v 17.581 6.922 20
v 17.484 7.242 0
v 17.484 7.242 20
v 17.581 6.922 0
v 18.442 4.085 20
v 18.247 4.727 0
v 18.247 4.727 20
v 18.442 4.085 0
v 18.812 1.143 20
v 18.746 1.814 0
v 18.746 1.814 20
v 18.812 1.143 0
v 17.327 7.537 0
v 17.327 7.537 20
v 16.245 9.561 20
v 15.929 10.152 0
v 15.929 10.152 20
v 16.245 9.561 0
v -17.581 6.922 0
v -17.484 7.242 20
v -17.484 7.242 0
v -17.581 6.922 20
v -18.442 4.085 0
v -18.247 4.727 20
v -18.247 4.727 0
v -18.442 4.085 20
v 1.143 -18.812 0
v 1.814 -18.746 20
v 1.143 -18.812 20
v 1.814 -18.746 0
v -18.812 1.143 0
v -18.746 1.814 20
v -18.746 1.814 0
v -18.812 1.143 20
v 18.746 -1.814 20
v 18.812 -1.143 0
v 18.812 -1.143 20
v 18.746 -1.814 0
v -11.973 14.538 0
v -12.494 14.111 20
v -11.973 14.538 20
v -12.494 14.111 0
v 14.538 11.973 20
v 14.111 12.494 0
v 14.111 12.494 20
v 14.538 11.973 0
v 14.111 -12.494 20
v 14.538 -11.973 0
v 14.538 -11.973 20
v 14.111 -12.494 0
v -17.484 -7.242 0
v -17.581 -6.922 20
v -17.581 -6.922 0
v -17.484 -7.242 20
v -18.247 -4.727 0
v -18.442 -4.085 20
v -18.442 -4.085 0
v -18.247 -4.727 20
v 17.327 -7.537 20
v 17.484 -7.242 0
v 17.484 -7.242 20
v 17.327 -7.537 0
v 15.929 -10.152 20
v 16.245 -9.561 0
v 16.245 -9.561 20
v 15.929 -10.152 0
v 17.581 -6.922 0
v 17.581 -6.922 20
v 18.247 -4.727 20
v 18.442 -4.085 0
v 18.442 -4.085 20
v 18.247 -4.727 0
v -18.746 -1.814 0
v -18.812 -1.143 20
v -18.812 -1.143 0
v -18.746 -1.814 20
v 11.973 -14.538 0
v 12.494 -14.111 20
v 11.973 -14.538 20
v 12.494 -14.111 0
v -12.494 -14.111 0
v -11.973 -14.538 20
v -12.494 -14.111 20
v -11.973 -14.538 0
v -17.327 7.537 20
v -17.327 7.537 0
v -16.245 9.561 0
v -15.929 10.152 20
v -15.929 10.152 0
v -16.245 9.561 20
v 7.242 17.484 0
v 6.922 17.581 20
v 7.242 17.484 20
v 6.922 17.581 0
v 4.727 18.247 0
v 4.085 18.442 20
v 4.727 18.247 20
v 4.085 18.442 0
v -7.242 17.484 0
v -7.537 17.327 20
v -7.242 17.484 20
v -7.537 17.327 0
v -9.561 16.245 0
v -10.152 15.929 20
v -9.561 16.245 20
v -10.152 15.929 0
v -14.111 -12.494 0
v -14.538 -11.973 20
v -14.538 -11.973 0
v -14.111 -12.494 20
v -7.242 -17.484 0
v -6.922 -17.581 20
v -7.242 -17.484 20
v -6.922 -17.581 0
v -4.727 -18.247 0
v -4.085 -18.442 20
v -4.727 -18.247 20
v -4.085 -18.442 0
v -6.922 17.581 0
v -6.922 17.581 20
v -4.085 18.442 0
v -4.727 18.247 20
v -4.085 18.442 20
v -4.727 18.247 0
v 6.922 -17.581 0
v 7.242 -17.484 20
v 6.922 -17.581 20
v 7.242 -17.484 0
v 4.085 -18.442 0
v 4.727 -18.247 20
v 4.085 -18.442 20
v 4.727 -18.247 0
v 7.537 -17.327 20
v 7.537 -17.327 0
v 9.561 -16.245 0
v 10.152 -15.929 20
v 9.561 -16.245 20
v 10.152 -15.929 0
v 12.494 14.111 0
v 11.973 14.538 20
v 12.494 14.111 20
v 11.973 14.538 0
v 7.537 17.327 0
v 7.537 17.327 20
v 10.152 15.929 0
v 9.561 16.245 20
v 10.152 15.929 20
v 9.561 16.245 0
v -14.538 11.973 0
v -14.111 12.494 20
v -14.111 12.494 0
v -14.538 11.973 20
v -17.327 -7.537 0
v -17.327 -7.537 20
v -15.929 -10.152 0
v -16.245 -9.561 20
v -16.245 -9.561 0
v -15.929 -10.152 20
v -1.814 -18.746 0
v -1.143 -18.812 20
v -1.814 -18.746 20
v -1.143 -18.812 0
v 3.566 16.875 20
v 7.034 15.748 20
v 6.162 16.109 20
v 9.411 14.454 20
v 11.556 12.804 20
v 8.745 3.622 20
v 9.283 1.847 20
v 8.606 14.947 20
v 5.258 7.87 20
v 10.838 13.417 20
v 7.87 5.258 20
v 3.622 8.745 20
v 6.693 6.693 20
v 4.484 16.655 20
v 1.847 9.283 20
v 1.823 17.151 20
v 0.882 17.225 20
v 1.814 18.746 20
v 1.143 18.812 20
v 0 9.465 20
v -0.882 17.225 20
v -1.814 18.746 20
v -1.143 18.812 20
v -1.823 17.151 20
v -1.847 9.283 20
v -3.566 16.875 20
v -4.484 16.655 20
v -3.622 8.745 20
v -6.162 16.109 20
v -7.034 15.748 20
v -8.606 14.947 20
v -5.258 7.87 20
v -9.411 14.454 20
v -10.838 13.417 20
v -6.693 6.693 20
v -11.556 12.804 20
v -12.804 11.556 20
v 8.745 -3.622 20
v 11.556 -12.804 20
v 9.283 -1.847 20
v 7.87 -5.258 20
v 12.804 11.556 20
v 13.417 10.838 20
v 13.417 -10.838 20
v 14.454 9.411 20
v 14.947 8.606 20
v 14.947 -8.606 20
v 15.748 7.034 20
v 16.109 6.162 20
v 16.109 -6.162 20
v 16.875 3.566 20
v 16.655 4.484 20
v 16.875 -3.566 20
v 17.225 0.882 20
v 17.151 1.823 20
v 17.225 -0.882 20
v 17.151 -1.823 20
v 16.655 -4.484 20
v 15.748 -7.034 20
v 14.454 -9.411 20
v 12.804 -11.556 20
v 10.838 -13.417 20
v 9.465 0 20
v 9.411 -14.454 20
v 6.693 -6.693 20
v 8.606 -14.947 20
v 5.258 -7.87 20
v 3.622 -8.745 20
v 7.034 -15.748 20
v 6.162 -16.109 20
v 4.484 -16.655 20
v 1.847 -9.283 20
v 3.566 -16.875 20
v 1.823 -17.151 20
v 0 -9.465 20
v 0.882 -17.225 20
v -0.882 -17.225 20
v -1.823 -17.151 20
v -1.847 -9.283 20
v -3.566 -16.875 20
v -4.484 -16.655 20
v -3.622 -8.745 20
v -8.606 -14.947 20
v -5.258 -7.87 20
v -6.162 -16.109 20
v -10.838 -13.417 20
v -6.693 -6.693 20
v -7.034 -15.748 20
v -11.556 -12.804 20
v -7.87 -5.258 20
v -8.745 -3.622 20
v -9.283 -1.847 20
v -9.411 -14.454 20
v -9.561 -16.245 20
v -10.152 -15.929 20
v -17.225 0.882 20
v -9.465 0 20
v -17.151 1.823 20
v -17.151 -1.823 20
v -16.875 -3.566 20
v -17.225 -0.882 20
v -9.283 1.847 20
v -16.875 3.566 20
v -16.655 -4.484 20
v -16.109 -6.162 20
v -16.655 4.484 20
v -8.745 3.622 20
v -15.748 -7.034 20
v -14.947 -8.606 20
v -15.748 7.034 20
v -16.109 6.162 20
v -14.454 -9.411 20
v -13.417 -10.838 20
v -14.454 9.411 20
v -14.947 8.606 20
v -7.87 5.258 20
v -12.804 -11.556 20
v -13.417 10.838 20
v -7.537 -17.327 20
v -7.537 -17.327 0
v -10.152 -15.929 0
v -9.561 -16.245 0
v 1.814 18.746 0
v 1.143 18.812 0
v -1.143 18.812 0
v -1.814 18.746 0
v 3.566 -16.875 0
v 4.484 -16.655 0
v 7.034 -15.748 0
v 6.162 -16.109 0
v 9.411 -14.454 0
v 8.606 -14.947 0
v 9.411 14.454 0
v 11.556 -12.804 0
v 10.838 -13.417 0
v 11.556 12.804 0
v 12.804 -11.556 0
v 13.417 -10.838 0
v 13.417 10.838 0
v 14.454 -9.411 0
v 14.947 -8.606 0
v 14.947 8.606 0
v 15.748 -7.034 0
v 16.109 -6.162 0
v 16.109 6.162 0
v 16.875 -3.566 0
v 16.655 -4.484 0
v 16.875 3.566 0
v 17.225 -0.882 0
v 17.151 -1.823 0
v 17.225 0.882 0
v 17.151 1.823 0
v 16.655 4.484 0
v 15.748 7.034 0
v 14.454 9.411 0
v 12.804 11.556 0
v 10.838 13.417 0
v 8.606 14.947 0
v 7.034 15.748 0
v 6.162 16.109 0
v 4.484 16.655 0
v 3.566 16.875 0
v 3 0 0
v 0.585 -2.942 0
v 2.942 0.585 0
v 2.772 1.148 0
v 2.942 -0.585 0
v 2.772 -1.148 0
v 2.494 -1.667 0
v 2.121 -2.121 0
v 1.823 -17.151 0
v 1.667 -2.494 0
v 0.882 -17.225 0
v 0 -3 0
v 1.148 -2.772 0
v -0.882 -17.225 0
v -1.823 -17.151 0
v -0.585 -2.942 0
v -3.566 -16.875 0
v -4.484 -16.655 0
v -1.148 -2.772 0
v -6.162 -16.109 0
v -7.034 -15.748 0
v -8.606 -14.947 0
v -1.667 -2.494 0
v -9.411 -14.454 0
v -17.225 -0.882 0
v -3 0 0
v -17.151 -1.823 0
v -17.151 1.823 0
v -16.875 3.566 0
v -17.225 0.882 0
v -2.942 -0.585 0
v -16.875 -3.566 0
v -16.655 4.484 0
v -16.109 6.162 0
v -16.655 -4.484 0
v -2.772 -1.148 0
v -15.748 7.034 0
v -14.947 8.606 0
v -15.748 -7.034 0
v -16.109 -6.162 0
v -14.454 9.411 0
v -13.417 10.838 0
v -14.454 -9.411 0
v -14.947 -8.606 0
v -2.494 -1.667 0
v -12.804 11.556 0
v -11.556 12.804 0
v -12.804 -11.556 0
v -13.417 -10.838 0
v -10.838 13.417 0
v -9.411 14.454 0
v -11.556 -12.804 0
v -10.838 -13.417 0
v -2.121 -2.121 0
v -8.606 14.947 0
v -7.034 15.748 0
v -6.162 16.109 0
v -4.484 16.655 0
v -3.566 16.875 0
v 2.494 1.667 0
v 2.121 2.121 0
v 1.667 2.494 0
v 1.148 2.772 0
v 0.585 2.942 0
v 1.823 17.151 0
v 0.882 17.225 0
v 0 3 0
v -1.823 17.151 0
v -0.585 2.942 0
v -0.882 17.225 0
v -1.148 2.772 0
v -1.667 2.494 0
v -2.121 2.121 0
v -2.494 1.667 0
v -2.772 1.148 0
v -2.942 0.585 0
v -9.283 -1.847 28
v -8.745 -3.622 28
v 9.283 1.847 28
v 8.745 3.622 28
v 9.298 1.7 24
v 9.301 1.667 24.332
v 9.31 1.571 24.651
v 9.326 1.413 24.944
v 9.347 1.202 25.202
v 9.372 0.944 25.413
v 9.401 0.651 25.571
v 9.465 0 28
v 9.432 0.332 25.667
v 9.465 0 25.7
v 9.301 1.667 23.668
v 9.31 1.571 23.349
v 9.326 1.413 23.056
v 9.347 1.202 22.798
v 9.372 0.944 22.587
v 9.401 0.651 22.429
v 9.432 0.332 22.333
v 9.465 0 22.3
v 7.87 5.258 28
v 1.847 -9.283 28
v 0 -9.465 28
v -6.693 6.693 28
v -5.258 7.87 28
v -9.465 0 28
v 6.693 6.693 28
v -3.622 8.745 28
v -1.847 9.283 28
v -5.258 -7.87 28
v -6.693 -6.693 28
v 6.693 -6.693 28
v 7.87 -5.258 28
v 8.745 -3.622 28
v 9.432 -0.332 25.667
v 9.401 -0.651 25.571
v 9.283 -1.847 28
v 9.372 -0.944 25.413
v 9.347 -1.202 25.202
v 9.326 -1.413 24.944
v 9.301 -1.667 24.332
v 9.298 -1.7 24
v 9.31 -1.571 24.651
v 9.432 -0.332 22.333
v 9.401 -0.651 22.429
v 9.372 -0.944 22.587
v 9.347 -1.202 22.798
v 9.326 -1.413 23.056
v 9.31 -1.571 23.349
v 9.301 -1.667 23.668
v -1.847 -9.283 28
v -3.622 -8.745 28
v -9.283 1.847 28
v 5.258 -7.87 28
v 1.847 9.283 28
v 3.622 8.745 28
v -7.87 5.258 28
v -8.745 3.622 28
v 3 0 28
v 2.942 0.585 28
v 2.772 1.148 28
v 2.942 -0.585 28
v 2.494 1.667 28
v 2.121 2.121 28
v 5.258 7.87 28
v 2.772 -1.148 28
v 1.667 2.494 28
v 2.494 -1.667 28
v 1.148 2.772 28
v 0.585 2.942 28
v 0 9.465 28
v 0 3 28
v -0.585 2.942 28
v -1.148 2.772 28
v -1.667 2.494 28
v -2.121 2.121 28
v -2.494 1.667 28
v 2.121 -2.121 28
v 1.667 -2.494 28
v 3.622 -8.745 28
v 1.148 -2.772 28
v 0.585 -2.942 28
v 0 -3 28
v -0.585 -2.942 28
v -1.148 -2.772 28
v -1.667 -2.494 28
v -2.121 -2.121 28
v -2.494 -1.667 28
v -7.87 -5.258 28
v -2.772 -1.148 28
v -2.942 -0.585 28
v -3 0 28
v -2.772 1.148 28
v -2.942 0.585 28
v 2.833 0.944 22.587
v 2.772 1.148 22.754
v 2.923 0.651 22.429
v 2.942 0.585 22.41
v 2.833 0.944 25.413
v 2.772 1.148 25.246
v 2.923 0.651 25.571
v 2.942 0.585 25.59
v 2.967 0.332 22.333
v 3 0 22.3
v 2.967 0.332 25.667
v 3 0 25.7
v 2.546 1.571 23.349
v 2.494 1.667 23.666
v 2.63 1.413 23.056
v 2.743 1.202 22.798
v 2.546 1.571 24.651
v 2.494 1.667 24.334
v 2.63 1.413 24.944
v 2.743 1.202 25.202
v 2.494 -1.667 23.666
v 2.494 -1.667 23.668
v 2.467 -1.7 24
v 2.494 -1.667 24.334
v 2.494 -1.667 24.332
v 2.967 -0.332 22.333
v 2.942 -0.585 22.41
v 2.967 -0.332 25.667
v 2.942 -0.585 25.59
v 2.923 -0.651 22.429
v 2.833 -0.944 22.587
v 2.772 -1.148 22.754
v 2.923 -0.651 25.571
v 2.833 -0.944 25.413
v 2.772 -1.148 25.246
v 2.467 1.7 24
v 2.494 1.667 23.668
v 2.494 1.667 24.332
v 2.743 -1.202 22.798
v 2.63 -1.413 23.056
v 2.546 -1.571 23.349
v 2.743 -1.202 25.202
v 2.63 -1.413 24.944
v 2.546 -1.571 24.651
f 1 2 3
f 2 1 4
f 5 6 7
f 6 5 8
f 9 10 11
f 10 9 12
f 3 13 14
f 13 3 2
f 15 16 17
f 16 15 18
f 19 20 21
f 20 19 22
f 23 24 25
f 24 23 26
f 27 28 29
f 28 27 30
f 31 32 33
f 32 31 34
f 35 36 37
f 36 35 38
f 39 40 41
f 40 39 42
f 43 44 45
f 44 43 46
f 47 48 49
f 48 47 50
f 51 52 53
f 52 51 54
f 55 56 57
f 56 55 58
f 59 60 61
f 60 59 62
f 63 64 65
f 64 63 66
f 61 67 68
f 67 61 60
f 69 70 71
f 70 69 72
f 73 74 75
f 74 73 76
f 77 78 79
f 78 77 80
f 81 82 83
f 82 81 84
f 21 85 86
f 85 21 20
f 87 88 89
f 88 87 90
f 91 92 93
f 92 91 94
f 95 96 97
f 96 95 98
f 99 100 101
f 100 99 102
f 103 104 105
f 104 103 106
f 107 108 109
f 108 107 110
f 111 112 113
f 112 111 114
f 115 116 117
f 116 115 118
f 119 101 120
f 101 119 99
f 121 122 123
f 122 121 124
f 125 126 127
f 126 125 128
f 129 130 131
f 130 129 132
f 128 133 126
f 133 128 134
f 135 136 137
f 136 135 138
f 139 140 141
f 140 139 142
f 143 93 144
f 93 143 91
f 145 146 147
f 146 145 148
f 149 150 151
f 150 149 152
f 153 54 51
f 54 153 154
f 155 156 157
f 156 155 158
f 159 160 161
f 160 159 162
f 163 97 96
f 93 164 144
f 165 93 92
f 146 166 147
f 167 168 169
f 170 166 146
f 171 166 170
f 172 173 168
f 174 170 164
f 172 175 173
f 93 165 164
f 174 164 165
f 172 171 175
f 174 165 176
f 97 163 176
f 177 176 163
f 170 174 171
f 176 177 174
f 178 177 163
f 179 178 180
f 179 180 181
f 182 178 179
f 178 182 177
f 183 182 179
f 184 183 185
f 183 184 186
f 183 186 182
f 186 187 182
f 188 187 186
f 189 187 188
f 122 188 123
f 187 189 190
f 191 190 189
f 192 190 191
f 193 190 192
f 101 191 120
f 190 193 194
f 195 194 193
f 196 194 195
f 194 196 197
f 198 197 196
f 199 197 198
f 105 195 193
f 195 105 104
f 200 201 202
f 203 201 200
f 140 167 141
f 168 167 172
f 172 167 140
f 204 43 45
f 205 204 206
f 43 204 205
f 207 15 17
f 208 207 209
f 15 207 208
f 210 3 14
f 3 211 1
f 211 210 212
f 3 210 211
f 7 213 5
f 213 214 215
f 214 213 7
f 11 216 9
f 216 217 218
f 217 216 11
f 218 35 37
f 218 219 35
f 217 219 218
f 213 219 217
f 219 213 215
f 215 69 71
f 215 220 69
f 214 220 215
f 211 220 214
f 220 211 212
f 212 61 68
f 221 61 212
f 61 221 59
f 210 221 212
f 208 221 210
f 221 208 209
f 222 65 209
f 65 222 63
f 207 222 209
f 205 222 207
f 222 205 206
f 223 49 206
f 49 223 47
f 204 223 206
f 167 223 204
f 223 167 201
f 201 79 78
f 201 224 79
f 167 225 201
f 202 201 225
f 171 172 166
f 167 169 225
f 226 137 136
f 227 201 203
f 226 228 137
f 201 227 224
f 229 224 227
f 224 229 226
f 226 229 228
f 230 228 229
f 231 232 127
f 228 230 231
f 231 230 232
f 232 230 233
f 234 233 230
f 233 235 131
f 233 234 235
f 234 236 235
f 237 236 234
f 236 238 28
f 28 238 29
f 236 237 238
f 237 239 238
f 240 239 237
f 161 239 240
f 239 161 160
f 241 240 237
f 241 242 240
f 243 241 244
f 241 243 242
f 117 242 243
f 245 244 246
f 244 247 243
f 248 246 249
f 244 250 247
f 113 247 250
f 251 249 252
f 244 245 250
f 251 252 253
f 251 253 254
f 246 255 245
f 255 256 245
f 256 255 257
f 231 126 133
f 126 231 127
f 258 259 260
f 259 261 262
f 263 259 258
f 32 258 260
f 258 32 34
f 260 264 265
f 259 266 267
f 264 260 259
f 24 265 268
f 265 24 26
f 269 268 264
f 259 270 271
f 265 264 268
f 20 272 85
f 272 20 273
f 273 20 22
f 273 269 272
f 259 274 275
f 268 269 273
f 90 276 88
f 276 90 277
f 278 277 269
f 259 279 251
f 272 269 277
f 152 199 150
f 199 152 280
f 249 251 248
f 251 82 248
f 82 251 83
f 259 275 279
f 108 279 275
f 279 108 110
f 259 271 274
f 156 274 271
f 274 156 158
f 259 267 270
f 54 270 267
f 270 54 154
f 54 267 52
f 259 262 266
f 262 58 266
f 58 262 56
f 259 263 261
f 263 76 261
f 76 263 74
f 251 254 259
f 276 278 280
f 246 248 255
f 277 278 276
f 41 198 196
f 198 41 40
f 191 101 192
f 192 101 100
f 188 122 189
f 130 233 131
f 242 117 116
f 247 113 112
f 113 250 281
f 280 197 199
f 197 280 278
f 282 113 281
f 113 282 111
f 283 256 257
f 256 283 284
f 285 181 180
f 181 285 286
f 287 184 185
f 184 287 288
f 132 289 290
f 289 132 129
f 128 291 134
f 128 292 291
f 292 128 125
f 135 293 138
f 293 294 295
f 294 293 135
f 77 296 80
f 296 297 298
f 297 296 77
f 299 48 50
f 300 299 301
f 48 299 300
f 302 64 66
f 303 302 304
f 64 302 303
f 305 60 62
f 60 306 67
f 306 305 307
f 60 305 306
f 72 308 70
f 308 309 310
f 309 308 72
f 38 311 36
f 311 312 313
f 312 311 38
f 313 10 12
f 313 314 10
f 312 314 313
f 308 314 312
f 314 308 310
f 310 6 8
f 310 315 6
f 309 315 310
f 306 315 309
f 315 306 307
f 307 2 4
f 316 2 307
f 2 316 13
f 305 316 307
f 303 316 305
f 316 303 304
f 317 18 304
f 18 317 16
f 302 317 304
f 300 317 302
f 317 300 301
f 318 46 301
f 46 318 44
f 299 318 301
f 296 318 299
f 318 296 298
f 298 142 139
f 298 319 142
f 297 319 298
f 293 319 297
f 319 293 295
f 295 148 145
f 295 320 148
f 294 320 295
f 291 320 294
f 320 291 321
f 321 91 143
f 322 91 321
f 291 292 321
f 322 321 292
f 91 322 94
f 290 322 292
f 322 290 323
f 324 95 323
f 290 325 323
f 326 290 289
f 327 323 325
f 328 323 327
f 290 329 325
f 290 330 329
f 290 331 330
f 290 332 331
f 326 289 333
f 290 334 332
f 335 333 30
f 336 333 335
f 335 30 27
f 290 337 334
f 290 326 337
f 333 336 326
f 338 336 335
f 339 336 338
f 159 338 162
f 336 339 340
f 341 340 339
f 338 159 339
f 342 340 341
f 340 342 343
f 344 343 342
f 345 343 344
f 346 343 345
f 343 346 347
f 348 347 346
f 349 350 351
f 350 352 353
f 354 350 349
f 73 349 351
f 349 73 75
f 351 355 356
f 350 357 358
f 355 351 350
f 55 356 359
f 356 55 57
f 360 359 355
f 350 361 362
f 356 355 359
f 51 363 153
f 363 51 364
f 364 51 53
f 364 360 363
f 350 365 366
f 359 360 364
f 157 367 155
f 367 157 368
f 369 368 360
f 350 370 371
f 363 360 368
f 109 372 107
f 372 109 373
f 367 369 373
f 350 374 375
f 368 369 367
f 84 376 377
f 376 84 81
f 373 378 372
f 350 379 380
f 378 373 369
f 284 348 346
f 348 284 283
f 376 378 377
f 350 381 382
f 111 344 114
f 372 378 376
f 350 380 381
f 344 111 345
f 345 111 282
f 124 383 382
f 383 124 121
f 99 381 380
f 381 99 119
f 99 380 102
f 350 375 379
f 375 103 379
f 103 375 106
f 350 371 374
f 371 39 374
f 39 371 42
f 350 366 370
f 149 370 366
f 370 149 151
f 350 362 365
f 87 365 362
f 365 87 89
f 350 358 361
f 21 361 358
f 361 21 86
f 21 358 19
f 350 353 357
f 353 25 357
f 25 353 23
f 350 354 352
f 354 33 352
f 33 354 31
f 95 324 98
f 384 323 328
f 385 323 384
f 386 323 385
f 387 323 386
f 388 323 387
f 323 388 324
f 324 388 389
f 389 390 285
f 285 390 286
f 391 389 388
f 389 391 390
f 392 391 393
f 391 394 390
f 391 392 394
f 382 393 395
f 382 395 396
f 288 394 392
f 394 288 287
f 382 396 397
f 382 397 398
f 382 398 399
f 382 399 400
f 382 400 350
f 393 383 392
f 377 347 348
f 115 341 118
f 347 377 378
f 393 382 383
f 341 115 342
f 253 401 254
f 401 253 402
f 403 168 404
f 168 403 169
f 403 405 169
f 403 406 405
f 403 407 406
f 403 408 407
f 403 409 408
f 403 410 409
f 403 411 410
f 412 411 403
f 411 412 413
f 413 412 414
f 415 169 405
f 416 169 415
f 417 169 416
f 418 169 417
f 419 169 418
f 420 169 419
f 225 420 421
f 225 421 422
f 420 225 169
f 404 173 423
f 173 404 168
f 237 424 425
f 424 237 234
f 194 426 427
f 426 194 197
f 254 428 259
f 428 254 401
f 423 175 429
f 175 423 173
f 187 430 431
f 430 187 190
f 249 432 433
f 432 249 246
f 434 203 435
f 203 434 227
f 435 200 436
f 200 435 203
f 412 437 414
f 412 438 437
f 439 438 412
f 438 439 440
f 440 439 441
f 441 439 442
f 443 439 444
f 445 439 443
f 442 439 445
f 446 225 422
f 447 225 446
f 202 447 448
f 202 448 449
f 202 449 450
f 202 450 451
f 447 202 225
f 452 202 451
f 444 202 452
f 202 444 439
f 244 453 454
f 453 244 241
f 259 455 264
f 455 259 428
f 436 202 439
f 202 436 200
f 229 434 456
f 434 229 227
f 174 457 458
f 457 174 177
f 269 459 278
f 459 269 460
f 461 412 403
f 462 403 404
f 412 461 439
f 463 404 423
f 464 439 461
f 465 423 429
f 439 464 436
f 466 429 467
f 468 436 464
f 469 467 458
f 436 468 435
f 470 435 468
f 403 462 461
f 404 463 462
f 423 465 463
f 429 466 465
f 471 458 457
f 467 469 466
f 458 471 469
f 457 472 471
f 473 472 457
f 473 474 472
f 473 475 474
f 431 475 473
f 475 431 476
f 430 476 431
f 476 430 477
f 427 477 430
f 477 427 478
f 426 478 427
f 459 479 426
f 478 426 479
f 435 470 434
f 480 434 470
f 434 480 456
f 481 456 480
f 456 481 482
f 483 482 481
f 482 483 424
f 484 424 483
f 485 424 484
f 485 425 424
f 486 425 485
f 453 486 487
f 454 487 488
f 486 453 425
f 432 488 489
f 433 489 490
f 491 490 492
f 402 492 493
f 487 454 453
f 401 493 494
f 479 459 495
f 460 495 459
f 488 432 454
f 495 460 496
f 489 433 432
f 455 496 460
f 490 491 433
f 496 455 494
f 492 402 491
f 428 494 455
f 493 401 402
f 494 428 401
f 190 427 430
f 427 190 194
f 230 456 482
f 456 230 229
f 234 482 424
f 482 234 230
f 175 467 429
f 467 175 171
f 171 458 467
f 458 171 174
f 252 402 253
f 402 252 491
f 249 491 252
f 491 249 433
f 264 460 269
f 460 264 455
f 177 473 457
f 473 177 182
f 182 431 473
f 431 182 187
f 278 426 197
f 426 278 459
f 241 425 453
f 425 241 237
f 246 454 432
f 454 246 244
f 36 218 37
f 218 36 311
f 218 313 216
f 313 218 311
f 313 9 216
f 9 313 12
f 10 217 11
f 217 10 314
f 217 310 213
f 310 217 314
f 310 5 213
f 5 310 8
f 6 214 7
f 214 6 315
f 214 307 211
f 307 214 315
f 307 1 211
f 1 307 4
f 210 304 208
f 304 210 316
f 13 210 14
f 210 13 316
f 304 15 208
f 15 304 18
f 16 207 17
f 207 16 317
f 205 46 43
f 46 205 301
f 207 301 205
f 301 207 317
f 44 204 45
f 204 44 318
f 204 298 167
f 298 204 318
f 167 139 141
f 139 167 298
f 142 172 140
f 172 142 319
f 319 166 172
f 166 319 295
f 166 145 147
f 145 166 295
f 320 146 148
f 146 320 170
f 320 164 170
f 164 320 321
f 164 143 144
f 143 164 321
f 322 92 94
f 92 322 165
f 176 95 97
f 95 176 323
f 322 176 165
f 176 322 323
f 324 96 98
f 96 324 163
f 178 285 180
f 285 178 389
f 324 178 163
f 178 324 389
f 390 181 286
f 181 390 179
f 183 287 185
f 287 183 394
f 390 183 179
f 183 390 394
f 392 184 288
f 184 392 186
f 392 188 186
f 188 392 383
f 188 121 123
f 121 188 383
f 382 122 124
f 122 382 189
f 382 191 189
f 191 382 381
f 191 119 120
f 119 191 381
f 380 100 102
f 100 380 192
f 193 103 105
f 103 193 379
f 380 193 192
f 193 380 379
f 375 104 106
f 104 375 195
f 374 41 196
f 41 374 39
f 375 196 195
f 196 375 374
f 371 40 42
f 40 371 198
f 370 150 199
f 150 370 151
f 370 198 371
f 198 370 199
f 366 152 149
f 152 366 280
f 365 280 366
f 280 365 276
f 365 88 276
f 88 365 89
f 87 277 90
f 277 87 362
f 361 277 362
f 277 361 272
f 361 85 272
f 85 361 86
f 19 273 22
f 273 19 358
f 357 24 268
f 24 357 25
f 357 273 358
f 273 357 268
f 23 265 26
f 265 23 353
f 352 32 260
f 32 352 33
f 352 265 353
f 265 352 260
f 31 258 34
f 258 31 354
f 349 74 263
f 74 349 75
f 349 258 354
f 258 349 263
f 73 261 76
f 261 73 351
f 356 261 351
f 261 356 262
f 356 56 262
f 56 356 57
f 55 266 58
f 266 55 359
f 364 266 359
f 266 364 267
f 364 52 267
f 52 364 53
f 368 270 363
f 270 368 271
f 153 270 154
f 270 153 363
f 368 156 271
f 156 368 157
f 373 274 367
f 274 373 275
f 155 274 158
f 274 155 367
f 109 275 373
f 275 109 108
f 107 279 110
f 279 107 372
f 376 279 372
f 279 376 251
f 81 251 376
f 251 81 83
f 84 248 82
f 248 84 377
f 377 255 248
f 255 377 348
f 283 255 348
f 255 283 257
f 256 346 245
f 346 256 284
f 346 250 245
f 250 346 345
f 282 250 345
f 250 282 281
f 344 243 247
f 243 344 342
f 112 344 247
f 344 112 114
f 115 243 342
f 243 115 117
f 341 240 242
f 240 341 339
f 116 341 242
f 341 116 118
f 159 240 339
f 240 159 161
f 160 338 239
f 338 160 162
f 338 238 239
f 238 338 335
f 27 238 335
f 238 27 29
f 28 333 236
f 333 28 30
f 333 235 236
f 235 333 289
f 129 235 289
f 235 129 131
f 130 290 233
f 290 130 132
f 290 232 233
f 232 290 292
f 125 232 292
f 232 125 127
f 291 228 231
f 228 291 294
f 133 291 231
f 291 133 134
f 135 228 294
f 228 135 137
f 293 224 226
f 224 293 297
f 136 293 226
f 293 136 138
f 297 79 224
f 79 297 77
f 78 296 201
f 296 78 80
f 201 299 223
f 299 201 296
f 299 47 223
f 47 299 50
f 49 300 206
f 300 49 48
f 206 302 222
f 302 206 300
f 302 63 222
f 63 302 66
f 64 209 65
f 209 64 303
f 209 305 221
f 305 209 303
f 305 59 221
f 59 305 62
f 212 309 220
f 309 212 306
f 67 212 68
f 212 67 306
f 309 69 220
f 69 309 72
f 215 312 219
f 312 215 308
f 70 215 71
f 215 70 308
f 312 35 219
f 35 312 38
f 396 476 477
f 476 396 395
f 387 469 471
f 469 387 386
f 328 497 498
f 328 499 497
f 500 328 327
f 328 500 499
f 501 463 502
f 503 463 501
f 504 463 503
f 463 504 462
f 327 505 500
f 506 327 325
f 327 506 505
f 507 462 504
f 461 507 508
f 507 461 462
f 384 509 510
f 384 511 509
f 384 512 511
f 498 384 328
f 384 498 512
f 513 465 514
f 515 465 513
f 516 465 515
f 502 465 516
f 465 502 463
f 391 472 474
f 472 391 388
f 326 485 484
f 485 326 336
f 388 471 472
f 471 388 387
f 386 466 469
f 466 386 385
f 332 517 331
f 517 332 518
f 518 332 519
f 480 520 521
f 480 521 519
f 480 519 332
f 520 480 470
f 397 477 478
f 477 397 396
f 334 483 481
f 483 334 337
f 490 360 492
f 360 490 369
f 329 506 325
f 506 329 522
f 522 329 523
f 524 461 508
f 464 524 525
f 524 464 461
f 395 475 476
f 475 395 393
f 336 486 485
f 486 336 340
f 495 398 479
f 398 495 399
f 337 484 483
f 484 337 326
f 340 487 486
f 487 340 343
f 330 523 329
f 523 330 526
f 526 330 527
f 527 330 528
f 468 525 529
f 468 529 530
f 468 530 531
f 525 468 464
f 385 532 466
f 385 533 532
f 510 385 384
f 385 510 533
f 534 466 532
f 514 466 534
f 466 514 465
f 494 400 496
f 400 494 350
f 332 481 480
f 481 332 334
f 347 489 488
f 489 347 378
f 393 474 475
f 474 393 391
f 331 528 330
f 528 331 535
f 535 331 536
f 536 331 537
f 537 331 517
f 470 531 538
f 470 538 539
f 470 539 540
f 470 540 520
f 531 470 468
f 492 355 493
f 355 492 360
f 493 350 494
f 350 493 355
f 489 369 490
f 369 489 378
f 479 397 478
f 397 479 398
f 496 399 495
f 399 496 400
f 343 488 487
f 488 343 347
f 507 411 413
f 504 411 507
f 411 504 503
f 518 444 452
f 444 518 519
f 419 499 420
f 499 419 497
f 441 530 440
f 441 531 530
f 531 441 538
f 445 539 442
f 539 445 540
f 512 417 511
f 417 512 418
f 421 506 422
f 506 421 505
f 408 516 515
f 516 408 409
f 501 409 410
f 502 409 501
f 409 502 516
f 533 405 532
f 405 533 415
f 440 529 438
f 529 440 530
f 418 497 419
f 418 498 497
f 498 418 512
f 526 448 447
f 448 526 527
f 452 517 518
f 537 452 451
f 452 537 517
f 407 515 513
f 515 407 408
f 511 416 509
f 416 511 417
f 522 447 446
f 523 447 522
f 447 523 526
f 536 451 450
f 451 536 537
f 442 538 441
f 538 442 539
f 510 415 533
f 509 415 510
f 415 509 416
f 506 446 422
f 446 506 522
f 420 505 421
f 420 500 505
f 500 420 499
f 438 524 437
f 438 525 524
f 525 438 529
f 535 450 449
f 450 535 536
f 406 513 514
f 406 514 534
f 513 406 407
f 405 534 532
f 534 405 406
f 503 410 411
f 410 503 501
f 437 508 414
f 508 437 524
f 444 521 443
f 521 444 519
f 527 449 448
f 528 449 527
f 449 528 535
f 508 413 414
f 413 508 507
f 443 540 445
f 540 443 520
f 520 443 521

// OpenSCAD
$fn = 32;

// ----------------------------------------------------------------------
// Timing pulley: GT3 40T, pitch 3 mm, 37.85 mm x 28 mm
// ----------------------------------------------------------------------

// --- parameters (mm) ---
belt_pitch = 3;           // belt pitch
n_teeth = 40;             // number of grooves
rim_w = 20;               // belt width between the flanges
tip_d = 37.85;            // tip circle diameter
root_d = 35.65;           // groove bottom diameter
groove_h = 1.1;           // groove depth
tooth_w = 2.1;            // groove width at the tip circle
shaft_d = 6;              // shaft bore
hub_d = 18.93;            // hub diameter
hub_h = 8;                // hub above the flange
bottom_z = 0;             // lowest point of the pulley
top_z = 28;               // highest point of the pulley
set_d = 3.4;              // set screw tap hole

module rim() {
  cylinder(h = rim_w, d = tip_d);
}

module groove_cutter() {
  /* belt tooth groove: deeper than wide, cut through the belt width */
  translate([root_d / 2, 0, 0])
    linear_extrude(height = rim_w)
      polygon(points = [[-0.6, -tooth_w * 0.42], [groove_h + 0.6, -tooth_w * 0.6],
                        [groove_h + 0.6, tooth_w * 0.6], [-0.6, tooth_w * 0.42]]);
}

module hub() {
  translate([0, 0, bottom_z]) cylinder(h = top_z - bottom_z, d = hub_d);
}

difference() {
  union() {
    rim();
    hub();
  }
  for (i = [0 : n_teeth - 1]) rotate([0, 0, i * 360 / n_teeth]) groove_cutter();
  translate([0, 0, bottom_z - 1]) cylinder(h = top_z - bottom_z + 2, d = shaft_d);
  translate([-1, 0, top_z - hub_h * 0.5]) rotate([0, 90, 0]) cylinder(h = hub_d / 2 + 3, d = set_d);
}
